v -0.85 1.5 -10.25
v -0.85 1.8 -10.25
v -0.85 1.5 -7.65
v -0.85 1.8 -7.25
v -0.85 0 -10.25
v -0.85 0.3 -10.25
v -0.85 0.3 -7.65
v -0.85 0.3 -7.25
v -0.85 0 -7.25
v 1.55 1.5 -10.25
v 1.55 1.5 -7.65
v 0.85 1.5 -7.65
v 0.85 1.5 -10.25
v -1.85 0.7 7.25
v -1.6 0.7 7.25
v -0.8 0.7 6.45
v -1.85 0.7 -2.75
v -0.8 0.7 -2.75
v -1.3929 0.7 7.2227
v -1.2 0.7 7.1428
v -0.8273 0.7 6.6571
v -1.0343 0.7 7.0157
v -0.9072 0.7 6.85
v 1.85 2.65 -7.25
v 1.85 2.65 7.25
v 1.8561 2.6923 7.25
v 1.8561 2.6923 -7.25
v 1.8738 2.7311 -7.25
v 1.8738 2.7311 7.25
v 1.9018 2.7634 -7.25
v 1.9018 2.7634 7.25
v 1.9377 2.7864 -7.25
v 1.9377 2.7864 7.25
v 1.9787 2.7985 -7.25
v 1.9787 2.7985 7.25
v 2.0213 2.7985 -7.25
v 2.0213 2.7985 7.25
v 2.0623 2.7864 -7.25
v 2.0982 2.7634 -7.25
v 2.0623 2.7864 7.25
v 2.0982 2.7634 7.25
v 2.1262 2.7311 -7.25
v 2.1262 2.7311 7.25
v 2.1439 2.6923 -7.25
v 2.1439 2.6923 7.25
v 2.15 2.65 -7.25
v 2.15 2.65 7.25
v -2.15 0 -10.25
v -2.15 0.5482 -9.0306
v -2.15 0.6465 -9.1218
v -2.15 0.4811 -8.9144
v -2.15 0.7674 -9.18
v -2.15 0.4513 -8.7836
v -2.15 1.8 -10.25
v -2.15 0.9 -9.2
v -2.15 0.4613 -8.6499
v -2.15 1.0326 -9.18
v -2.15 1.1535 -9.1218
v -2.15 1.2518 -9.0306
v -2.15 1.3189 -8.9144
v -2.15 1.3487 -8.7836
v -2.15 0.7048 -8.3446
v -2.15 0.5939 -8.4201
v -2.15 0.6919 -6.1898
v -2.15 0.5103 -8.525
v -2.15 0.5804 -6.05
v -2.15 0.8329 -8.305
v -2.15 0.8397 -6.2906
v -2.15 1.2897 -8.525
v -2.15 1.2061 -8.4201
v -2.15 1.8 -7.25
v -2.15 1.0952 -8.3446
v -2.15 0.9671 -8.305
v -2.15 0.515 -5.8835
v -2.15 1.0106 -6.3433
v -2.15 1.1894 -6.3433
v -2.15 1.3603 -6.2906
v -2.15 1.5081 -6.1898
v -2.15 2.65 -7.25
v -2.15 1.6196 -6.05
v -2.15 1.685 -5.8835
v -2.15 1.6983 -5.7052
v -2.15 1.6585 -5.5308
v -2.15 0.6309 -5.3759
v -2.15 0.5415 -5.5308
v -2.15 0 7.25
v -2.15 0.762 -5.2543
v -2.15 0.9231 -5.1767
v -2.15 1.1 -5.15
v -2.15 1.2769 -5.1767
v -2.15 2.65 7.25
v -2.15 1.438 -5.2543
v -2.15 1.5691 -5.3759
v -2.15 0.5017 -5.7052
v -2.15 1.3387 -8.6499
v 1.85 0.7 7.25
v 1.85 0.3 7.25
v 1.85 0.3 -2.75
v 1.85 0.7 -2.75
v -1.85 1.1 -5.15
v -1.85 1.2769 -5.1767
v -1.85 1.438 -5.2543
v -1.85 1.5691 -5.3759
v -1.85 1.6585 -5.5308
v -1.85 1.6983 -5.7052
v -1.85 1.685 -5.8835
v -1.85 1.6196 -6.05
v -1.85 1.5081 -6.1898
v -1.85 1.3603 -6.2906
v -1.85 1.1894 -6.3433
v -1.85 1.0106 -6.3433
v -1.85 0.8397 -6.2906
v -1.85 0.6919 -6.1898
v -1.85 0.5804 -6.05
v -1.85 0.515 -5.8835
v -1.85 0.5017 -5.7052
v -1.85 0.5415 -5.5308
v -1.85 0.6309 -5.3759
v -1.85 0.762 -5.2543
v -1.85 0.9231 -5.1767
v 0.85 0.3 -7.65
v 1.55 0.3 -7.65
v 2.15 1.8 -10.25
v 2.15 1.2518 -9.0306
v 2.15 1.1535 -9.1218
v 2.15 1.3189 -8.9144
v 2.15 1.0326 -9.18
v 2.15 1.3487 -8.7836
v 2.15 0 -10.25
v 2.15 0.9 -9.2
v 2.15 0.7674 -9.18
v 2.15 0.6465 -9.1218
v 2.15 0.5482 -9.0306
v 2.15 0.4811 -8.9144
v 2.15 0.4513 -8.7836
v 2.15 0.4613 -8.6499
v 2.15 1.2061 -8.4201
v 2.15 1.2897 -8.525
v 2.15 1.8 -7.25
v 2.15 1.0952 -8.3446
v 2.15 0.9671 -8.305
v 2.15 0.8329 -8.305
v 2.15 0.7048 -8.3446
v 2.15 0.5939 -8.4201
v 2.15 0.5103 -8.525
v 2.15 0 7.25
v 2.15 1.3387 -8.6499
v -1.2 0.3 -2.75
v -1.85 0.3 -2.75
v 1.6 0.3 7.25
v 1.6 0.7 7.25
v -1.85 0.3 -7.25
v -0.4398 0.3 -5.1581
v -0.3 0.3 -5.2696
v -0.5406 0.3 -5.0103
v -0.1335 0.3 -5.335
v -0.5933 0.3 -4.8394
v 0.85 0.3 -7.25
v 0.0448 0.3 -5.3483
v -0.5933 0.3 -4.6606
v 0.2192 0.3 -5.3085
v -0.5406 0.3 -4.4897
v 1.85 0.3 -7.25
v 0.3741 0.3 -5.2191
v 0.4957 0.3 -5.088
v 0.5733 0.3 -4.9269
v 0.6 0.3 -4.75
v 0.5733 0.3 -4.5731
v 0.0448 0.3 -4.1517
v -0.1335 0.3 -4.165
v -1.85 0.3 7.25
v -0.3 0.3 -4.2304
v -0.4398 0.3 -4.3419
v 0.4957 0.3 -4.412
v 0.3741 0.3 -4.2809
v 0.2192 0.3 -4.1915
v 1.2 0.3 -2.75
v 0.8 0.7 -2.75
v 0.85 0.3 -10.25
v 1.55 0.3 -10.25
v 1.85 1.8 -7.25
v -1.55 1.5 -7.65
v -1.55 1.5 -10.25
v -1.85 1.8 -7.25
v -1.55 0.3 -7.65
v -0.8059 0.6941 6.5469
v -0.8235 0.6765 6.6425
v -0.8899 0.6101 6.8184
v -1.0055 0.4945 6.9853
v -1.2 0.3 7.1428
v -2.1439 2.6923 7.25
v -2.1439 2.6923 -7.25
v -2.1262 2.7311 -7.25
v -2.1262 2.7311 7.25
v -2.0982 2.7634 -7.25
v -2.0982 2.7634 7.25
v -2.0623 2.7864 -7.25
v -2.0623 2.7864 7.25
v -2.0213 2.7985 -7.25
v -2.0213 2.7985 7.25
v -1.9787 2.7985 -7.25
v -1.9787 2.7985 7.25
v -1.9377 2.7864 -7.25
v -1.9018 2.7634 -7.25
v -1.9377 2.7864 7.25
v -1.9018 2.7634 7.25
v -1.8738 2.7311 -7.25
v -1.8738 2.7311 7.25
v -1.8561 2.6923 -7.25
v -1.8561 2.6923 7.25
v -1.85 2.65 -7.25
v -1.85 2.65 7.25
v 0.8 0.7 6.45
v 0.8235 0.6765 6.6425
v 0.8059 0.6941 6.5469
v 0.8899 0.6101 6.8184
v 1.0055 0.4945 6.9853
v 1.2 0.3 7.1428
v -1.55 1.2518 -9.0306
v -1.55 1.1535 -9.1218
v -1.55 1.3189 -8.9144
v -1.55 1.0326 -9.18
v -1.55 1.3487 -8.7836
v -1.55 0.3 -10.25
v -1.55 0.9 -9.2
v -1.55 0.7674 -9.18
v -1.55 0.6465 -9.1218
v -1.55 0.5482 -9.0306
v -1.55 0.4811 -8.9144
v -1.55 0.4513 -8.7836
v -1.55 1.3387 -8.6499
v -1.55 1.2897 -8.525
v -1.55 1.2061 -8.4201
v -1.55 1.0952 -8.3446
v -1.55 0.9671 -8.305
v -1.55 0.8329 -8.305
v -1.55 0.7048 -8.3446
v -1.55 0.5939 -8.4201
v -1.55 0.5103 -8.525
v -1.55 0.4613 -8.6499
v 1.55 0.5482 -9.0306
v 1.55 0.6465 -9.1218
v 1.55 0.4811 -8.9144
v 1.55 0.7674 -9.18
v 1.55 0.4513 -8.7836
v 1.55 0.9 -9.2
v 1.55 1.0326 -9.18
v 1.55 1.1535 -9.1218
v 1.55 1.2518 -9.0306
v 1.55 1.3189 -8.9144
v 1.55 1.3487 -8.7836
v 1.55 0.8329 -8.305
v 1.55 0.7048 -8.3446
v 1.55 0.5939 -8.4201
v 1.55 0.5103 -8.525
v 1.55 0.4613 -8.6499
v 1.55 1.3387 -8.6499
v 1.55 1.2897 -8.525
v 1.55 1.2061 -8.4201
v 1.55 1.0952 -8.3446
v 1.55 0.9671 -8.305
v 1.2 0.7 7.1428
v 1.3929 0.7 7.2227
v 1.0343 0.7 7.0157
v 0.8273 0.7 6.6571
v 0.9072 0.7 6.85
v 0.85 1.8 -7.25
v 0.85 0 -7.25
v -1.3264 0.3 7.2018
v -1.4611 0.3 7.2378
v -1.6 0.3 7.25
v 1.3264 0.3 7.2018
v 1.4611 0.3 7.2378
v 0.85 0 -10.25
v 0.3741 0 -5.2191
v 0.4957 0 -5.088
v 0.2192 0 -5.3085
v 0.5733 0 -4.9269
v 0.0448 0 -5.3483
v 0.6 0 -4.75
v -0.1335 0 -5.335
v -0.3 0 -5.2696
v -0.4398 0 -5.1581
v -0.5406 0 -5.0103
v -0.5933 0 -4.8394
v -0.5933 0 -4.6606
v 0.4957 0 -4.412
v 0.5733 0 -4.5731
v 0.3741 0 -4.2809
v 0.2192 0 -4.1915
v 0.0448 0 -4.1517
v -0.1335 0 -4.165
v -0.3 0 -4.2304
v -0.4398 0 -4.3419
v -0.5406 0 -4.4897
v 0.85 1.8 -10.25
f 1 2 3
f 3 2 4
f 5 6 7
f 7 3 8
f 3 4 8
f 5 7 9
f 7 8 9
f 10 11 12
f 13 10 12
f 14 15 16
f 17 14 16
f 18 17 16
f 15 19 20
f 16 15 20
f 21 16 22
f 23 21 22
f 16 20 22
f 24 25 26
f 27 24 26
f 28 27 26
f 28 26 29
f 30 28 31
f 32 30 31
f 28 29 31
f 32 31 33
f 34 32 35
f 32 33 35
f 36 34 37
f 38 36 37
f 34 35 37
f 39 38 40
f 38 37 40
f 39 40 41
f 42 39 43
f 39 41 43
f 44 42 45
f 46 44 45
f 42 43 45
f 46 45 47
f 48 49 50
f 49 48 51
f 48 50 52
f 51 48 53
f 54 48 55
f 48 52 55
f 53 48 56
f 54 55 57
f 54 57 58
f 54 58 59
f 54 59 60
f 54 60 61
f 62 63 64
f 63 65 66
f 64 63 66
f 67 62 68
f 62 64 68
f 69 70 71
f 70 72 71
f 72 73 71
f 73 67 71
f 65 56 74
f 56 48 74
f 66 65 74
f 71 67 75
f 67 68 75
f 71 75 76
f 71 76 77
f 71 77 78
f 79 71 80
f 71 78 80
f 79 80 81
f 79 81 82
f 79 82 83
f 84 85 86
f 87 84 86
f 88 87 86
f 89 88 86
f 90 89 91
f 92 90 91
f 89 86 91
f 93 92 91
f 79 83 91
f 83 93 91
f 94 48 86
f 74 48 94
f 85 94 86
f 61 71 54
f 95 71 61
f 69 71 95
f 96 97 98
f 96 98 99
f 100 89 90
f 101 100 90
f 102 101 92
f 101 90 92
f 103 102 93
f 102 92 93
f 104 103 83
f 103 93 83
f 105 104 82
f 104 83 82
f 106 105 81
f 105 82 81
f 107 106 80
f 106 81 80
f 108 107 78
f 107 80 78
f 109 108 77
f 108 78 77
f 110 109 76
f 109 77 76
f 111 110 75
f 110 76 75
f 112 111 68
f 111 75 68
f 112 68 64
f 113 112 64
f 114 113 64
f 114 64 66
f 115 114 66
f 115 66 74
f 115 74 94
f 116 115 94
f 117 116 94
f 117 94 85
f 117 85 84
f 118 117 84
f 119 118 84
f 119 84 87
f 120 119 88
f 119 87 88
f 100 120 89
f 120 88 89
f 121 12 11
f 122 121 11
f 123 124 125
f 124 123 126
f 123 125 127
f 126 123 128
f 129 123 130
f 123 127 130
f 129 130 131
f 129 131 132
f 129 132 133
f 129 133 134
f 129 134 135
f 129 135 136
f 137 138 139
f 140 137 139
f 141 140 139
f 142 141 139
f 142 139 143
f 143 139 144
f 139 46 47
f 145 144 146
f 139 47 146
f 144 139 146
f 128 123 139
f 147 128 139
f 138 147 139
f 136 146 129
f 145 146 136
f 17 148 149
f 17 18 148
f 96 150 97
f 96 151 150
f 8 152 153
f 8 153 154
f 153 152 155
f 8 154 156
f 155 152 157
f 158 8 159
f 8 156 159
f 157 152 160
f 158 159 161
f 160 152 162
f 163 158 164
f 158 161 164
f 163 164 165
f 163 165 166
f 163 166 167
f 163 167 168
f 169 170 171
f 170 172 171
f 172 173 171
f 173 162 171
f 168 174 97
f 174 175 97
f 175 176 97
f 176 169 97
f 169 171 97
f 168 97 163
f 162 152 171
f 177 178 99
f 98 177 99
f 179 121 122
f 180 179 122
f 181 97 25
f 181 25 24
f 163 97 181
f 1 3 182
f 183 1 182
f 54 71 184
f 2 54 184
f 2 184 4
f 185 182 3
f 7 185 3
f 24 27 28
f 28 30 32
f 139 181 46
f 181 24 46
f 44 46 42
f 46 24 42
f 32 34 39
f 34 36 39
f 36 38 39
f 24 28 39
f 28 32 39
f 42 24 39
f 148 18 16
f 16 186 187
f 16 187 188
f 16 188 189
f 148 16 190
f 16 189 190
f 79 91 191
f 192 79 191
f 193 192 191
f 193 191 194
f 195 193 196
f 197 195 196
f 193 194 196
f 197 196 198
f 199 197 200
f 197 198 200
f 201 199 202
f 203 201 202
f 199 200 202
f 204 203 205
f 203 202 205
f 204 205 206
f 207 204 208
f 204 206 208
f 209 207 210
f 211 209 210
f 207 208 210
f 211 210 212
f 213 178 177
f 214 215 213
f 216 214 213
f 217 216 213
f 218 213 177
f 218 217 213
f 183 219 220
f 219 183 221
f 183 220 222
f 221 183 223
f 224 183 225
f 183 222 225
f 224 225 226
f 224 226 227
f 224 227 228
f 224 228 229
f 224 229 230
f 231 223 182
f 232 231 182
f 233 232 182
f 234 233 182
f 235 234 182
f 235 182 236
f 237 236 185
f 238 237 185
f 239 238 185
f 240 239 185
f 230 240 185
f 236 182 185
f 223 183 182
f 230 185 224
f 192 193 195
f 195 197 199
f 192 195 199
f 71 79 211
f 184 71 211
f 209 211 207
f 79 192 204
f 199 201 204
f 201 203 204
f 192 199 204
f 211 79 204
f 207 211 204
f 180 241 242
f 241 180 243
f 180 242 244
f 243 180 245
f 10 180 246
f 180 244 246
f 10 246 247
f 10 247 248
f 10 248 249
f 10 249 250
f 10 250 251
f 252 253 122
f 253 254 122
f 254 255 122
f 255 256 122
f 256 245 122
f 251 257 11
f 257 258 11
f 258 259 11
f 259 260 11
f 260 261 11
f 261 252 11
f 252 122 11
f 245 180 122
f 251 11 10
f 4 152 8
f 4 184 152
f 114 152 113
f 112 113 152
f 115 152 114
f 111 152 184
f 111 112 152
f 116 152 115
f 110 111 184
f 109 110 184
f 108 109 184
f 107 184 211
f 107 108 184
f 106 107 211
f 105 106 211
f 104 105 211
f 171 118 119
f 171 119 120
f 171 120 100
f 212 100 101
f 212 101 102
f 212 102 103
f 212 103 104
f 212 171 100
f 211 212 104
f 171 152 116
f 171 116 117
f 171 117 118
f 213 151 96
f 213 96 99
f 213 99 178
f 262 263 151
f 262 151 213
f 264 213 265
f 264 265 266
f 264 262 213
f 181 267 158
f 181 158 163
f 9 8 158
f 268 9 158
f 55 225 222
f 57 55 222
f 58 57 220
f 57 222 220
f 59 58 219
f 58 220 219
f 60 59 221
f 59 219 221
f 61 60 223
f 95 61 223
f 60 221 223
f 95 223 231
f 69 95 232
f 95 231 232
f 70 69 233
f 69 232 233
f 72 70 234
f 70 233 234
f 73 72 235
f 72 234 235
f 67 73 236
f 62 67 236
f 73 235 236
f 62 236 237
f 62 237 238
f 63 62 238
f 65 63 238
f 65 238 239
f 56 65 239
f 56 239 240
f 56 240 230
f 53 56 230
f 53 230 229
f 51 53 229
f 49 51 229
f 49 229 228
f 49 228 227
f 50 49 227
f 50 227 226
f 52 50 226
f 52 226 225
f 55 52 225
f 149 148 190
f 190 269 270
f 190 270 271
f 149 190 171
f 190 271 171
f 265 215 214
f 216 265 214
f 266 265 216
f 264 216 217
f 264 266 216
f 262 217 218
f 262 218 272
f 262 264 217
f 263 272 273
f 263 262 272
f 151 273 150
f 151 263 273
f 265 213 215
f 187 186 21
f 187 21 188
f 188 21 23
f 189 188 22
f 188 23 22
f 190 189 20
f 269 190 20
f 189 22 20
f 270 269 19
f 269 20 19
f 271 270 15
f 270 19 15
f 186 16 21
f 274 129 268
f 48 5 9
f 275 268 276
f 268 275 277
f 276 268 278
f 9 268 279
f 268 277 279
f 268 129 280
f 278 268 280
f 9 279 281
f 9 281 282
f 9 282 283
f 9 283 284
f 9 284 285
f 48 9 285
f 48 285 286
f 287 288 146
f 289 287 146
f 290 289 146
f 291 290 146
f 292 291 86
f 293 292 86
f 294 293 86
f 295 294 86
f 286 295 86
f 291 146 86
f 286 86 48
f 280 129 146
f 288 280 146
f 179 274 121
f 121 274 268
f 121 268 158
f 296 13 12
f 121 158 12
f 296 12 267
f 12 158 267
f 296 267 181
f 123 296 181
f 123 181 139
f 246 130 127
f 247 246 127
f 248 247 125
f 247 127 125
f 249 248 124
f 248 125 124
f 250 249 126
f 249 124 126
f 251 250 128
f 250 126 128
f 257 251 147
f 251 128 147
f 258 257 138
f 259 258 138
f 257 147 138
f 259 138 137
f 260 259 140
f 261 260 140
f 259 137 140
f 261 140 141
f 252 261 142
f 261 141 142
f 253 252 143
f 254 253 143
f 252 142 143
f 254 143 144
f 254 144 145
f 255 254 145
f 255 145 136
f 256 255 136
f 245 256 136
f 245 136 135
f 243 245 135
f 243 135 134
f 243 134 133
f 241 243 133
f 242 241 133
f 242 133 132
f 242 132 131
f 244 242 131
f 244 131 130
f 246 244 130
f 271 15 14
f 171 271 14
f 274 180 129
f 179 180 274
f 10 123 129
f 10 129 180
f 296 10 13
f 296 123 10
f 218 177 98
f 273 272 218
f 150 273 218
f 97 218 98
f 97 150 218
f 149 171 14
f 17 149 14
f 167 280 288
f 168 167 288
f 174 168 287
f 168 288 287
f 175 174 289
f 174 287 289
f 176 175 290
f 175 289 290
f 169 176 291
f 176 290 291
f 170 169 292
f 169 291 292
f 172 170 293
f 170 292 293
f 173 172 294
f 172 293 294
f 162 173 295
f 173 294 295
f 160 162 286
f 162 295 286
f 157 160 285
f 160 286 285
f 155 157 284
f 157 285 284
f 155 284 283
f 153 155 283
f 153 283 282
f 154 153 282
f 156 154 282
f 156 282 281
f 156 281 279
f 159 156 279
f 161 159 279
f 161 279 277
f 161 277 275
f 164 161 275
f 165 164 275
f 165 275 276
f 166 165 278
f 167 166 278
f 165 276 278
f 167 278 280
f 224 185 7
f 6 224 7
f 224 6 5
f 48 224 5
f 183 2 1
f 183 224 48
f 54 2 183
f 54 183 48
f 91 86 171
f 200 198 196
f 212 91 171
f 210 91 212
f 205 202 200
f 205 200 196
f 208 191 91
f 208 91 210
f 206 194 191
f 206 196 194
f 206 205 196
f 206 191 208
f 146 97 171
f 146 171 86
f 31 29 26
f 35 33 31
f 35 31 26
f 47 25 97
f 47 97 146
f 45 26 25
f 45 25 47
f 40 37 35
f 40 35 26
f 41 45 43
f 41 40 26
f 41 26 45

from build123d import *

# Parameters (mm, degrees)
SKETCH1_W                   = 4.3
SKETCH1_H                   = 14.5
NP_HOLDER_BASE_DEPTH        = 2.5
NP_HOLDER_THICKNESS_T       = -0.3
NP2_0_IMEC_DOVETAIL_DEPTH   = 10
NP2_0_IMEC_DOVETAIL_2_DEPTH = 10
SKETCH6_W                   = 0.3
SKETCH6_H                   = 0.15
INNER_PIECE_RAILS_DEPTH     = 14.5
EXTRACTION_HOOKS_DEPTH      = 3
SKETCH8_R                   = 0.45
EXTRACTION_HOLE_DEPTH       = 4.3
SKETCH15_W                  = 0.7
SKETCH15_H                  = 1.2
EXTRACTIONSTOPPER_DEPTH     = 0.4
SKETCH12_R                  = 0.6
ADHESIVE_HOLE_DEPTH         = 0.3
SKETCH13_R                  = 0.6
VERTICAL_ANCHOR_HOLE_DEPTH  = 0.3
ENTRY_EDGE_SMOOTHING_DEPTH  = 0.4


with BuildPart() as part:
    # Sketch1 → NP holder base (new body)
    with BuildSketch(Plane(origin=(0, 0, 0), x_dir=(1, 0, 0), z_dir=(0, 1, 0))):
        Rectangle(SKETCH1_W, SKETCH1_H)
    extrude(amount=NP_HOLDER_BASE_DEPTH)

    # NP holder thickness
    np_holder_thickness_openings = [part.faces().sort_by_distance(p)[0] for p in [
        (0, 2.5, 0),
        (0, 1.25, 7.25),
        (0, 1.25, -7.25),
    ]]
    offset(amount=NP_HOLDER_THICKNESS_T, openings=np_holder_thickness_openings, kind=Kind.INTERSECTION)

    # Sketch6 → inner piece rails (add)
    with BuildSketch(Plane.XY.offset(7.25)):
        with Locations((-2, 2.575)):
            Rectangle(SKETCH6_W, SKETCH6_H)
        with BuildLine():
            ThreePointArc((-2.15, 2.65), (-2, 2.8), (-1.85, 2.65))
            Line((-1.85, 2.65), (-2.15, 2.65))
        make_face()
        with BuildLine():
            ThreePointArc((1.85, 2.65), (2, 2.8), (2.15, 2.65))
            Line((2.15, 2.65), (1.85, 2.65))
        make_face()
        with Locations((2, 2.575)):
            Rectangle(SKETCH6_W, SKETCH6_H)
    extrude(amount=-INNER_PIECE_RAILS_DEPTH)

    # Sketch7 → extraction hooks (add)
    with BuildSketch(Plane(origin=(0, 0, -7.25), x_dir=(-1, 0, 0), z_dir=(0, 0, -1))):
        Polygon((-2.15, 1.8), (-2.15, 0), (-0.85, 0), (-0.85, 0.3), (-1.55, 0.3), (-1.55, 1.5), (-0.85, 1.5), (-0.85, 1.8), align=None)
        Polygon((0.85, 0.3), (0.85, 0), (2.15, 0), (2.15, 1.8), (0.85, 1.8), (0.85, 1.5), (1.55, 1.5), (1.55, 0.3), align=None)
    extrude(amount=EXTRACTION_HOOKS_DEPTH)

    # Sketch8 → extraction hole (cut)
    with BuildSketch(Plane(origin=(2.15, 0, 0), x_dir=(0, 0, -1), z_dir=(1, 0, 0))):
        with Locations((8.75, 0.9)):
            Circle(SKETCH8_R)
    extrude(amount=-EXTRACTION_HOLE_DEPTH, mode=Mode.SUBTRACT)

    # Sketch15 → extractionstopper (add)
    with BuildSketch(Plane.XY.offset(-7.25)):
        with Locations((1.2, 0.9)):
            Rectangle(SKETCH15_W, SKETCH15_H)
        with Locations((-1.2, 0.9)):
            Rectangle(SKETCH15_W, SKETCH15_H)
    extrude(amount=-EXTRACTIONSTOPPER_DEPTH)

    # Sketch12 → adhesive Hole (cut)
    with BuildSketch(Plane.XZ):
        with Locations((0, -4.75)):
            Circle(SKETCH12_R)
    extrude(amount=-ADHESIVE_HOLE_DEPTH, mode=Mode.SUBTRACT)

    # Sketch13 → vertical anchor hole (cut)
    with BuildSketch(Plane.ZY.offset(2.15)):
        with Locations((-5.75, 1.1)):
            Circle(SKETCH13_R)
    extrude(amount=-VERTICAL_ANCHOR_HOLE_DEPTH, mode=Mode.SUBTRACT)


with BuildPart() as body_2:
    # Sketch3 → NP2.0 imec dovetail (new body)
    with BuildSketch(Plane(origin=(0, 0, 7.25), x_dir=(-1, 0, 0), z_dir=(0, 0, -1))):
        Polygon((-1.85, 0.3), (-1.85, 0.7), (-0.8, 0.7), (-1.2, 0.3), align=None)
    extrude(amount=NP2_0_IMEC_DOVETAIL_DEPTH)


with BuildPart() as body_3:
    # Sketch3 → NP2.0 imec dovetail 2 (new body)
    with BuildSketch(Plane(origin=(0, 0, 7.25), x_dir=(-1, 0, 0), z_dir=(0, 0, -1))):
        Polygon((1.2, 0.3), (1.85, 0.3), (1.85, 0.7), (0.8, 0.7), align=None)
    extrude(amount=NP2_0_IMEC_DOVETAIL_2_DEPTH)


with BuildPart() as entry_edge_smoothing_tool:
    # Sketch16 → entry edge smoothing (new body)
    with BuildSketch(Plane(origin=(0, 0.7, 0), x_dir=(1, 0, 0), z_dir=(0, 1, 0))):
        with BuildLine():
            Line((-1.6, -7.25), (-0.8, -7.25))
            Line((-0.8, -7.25), (-0.8, -6.45))
            ThreePointArc((-0.8, -6.45), (-1.034314575, -7.015685425), (-1.6, -7.25))
        make_face()
        with BuildLine():
            Line((0.8, -7.25), (0.8, -6.45))
            ThreePointArc((0.8, -6.45), (1.034314575, -7.015685425), (1.6, -7.25))
            Line((1.6, -7.25), (0.8, -7.25))
        make_face()
    extrude(amount=-ENTRY_EDGE_SMOOTHING_DEPTH)


with BuildPart() as body_2_1:
    add(body_2.part)

    # entry edge smoothing: cut by entry_edge_smoothing_tool
    add(entry_edge_smoothing_tool.part, mode=Mode.SUBTRACT)


with BuildPart() as body_3_1:
    add(body_3.part)

    # entry edge smoothing: cut by entry_edge_smoothing_tool
    add(entry_edge_smoothing_tool.part, mode=Mode.SUBTRACT)


solid = Compound([part.part, body_2_1.part, body_3_1.part])
